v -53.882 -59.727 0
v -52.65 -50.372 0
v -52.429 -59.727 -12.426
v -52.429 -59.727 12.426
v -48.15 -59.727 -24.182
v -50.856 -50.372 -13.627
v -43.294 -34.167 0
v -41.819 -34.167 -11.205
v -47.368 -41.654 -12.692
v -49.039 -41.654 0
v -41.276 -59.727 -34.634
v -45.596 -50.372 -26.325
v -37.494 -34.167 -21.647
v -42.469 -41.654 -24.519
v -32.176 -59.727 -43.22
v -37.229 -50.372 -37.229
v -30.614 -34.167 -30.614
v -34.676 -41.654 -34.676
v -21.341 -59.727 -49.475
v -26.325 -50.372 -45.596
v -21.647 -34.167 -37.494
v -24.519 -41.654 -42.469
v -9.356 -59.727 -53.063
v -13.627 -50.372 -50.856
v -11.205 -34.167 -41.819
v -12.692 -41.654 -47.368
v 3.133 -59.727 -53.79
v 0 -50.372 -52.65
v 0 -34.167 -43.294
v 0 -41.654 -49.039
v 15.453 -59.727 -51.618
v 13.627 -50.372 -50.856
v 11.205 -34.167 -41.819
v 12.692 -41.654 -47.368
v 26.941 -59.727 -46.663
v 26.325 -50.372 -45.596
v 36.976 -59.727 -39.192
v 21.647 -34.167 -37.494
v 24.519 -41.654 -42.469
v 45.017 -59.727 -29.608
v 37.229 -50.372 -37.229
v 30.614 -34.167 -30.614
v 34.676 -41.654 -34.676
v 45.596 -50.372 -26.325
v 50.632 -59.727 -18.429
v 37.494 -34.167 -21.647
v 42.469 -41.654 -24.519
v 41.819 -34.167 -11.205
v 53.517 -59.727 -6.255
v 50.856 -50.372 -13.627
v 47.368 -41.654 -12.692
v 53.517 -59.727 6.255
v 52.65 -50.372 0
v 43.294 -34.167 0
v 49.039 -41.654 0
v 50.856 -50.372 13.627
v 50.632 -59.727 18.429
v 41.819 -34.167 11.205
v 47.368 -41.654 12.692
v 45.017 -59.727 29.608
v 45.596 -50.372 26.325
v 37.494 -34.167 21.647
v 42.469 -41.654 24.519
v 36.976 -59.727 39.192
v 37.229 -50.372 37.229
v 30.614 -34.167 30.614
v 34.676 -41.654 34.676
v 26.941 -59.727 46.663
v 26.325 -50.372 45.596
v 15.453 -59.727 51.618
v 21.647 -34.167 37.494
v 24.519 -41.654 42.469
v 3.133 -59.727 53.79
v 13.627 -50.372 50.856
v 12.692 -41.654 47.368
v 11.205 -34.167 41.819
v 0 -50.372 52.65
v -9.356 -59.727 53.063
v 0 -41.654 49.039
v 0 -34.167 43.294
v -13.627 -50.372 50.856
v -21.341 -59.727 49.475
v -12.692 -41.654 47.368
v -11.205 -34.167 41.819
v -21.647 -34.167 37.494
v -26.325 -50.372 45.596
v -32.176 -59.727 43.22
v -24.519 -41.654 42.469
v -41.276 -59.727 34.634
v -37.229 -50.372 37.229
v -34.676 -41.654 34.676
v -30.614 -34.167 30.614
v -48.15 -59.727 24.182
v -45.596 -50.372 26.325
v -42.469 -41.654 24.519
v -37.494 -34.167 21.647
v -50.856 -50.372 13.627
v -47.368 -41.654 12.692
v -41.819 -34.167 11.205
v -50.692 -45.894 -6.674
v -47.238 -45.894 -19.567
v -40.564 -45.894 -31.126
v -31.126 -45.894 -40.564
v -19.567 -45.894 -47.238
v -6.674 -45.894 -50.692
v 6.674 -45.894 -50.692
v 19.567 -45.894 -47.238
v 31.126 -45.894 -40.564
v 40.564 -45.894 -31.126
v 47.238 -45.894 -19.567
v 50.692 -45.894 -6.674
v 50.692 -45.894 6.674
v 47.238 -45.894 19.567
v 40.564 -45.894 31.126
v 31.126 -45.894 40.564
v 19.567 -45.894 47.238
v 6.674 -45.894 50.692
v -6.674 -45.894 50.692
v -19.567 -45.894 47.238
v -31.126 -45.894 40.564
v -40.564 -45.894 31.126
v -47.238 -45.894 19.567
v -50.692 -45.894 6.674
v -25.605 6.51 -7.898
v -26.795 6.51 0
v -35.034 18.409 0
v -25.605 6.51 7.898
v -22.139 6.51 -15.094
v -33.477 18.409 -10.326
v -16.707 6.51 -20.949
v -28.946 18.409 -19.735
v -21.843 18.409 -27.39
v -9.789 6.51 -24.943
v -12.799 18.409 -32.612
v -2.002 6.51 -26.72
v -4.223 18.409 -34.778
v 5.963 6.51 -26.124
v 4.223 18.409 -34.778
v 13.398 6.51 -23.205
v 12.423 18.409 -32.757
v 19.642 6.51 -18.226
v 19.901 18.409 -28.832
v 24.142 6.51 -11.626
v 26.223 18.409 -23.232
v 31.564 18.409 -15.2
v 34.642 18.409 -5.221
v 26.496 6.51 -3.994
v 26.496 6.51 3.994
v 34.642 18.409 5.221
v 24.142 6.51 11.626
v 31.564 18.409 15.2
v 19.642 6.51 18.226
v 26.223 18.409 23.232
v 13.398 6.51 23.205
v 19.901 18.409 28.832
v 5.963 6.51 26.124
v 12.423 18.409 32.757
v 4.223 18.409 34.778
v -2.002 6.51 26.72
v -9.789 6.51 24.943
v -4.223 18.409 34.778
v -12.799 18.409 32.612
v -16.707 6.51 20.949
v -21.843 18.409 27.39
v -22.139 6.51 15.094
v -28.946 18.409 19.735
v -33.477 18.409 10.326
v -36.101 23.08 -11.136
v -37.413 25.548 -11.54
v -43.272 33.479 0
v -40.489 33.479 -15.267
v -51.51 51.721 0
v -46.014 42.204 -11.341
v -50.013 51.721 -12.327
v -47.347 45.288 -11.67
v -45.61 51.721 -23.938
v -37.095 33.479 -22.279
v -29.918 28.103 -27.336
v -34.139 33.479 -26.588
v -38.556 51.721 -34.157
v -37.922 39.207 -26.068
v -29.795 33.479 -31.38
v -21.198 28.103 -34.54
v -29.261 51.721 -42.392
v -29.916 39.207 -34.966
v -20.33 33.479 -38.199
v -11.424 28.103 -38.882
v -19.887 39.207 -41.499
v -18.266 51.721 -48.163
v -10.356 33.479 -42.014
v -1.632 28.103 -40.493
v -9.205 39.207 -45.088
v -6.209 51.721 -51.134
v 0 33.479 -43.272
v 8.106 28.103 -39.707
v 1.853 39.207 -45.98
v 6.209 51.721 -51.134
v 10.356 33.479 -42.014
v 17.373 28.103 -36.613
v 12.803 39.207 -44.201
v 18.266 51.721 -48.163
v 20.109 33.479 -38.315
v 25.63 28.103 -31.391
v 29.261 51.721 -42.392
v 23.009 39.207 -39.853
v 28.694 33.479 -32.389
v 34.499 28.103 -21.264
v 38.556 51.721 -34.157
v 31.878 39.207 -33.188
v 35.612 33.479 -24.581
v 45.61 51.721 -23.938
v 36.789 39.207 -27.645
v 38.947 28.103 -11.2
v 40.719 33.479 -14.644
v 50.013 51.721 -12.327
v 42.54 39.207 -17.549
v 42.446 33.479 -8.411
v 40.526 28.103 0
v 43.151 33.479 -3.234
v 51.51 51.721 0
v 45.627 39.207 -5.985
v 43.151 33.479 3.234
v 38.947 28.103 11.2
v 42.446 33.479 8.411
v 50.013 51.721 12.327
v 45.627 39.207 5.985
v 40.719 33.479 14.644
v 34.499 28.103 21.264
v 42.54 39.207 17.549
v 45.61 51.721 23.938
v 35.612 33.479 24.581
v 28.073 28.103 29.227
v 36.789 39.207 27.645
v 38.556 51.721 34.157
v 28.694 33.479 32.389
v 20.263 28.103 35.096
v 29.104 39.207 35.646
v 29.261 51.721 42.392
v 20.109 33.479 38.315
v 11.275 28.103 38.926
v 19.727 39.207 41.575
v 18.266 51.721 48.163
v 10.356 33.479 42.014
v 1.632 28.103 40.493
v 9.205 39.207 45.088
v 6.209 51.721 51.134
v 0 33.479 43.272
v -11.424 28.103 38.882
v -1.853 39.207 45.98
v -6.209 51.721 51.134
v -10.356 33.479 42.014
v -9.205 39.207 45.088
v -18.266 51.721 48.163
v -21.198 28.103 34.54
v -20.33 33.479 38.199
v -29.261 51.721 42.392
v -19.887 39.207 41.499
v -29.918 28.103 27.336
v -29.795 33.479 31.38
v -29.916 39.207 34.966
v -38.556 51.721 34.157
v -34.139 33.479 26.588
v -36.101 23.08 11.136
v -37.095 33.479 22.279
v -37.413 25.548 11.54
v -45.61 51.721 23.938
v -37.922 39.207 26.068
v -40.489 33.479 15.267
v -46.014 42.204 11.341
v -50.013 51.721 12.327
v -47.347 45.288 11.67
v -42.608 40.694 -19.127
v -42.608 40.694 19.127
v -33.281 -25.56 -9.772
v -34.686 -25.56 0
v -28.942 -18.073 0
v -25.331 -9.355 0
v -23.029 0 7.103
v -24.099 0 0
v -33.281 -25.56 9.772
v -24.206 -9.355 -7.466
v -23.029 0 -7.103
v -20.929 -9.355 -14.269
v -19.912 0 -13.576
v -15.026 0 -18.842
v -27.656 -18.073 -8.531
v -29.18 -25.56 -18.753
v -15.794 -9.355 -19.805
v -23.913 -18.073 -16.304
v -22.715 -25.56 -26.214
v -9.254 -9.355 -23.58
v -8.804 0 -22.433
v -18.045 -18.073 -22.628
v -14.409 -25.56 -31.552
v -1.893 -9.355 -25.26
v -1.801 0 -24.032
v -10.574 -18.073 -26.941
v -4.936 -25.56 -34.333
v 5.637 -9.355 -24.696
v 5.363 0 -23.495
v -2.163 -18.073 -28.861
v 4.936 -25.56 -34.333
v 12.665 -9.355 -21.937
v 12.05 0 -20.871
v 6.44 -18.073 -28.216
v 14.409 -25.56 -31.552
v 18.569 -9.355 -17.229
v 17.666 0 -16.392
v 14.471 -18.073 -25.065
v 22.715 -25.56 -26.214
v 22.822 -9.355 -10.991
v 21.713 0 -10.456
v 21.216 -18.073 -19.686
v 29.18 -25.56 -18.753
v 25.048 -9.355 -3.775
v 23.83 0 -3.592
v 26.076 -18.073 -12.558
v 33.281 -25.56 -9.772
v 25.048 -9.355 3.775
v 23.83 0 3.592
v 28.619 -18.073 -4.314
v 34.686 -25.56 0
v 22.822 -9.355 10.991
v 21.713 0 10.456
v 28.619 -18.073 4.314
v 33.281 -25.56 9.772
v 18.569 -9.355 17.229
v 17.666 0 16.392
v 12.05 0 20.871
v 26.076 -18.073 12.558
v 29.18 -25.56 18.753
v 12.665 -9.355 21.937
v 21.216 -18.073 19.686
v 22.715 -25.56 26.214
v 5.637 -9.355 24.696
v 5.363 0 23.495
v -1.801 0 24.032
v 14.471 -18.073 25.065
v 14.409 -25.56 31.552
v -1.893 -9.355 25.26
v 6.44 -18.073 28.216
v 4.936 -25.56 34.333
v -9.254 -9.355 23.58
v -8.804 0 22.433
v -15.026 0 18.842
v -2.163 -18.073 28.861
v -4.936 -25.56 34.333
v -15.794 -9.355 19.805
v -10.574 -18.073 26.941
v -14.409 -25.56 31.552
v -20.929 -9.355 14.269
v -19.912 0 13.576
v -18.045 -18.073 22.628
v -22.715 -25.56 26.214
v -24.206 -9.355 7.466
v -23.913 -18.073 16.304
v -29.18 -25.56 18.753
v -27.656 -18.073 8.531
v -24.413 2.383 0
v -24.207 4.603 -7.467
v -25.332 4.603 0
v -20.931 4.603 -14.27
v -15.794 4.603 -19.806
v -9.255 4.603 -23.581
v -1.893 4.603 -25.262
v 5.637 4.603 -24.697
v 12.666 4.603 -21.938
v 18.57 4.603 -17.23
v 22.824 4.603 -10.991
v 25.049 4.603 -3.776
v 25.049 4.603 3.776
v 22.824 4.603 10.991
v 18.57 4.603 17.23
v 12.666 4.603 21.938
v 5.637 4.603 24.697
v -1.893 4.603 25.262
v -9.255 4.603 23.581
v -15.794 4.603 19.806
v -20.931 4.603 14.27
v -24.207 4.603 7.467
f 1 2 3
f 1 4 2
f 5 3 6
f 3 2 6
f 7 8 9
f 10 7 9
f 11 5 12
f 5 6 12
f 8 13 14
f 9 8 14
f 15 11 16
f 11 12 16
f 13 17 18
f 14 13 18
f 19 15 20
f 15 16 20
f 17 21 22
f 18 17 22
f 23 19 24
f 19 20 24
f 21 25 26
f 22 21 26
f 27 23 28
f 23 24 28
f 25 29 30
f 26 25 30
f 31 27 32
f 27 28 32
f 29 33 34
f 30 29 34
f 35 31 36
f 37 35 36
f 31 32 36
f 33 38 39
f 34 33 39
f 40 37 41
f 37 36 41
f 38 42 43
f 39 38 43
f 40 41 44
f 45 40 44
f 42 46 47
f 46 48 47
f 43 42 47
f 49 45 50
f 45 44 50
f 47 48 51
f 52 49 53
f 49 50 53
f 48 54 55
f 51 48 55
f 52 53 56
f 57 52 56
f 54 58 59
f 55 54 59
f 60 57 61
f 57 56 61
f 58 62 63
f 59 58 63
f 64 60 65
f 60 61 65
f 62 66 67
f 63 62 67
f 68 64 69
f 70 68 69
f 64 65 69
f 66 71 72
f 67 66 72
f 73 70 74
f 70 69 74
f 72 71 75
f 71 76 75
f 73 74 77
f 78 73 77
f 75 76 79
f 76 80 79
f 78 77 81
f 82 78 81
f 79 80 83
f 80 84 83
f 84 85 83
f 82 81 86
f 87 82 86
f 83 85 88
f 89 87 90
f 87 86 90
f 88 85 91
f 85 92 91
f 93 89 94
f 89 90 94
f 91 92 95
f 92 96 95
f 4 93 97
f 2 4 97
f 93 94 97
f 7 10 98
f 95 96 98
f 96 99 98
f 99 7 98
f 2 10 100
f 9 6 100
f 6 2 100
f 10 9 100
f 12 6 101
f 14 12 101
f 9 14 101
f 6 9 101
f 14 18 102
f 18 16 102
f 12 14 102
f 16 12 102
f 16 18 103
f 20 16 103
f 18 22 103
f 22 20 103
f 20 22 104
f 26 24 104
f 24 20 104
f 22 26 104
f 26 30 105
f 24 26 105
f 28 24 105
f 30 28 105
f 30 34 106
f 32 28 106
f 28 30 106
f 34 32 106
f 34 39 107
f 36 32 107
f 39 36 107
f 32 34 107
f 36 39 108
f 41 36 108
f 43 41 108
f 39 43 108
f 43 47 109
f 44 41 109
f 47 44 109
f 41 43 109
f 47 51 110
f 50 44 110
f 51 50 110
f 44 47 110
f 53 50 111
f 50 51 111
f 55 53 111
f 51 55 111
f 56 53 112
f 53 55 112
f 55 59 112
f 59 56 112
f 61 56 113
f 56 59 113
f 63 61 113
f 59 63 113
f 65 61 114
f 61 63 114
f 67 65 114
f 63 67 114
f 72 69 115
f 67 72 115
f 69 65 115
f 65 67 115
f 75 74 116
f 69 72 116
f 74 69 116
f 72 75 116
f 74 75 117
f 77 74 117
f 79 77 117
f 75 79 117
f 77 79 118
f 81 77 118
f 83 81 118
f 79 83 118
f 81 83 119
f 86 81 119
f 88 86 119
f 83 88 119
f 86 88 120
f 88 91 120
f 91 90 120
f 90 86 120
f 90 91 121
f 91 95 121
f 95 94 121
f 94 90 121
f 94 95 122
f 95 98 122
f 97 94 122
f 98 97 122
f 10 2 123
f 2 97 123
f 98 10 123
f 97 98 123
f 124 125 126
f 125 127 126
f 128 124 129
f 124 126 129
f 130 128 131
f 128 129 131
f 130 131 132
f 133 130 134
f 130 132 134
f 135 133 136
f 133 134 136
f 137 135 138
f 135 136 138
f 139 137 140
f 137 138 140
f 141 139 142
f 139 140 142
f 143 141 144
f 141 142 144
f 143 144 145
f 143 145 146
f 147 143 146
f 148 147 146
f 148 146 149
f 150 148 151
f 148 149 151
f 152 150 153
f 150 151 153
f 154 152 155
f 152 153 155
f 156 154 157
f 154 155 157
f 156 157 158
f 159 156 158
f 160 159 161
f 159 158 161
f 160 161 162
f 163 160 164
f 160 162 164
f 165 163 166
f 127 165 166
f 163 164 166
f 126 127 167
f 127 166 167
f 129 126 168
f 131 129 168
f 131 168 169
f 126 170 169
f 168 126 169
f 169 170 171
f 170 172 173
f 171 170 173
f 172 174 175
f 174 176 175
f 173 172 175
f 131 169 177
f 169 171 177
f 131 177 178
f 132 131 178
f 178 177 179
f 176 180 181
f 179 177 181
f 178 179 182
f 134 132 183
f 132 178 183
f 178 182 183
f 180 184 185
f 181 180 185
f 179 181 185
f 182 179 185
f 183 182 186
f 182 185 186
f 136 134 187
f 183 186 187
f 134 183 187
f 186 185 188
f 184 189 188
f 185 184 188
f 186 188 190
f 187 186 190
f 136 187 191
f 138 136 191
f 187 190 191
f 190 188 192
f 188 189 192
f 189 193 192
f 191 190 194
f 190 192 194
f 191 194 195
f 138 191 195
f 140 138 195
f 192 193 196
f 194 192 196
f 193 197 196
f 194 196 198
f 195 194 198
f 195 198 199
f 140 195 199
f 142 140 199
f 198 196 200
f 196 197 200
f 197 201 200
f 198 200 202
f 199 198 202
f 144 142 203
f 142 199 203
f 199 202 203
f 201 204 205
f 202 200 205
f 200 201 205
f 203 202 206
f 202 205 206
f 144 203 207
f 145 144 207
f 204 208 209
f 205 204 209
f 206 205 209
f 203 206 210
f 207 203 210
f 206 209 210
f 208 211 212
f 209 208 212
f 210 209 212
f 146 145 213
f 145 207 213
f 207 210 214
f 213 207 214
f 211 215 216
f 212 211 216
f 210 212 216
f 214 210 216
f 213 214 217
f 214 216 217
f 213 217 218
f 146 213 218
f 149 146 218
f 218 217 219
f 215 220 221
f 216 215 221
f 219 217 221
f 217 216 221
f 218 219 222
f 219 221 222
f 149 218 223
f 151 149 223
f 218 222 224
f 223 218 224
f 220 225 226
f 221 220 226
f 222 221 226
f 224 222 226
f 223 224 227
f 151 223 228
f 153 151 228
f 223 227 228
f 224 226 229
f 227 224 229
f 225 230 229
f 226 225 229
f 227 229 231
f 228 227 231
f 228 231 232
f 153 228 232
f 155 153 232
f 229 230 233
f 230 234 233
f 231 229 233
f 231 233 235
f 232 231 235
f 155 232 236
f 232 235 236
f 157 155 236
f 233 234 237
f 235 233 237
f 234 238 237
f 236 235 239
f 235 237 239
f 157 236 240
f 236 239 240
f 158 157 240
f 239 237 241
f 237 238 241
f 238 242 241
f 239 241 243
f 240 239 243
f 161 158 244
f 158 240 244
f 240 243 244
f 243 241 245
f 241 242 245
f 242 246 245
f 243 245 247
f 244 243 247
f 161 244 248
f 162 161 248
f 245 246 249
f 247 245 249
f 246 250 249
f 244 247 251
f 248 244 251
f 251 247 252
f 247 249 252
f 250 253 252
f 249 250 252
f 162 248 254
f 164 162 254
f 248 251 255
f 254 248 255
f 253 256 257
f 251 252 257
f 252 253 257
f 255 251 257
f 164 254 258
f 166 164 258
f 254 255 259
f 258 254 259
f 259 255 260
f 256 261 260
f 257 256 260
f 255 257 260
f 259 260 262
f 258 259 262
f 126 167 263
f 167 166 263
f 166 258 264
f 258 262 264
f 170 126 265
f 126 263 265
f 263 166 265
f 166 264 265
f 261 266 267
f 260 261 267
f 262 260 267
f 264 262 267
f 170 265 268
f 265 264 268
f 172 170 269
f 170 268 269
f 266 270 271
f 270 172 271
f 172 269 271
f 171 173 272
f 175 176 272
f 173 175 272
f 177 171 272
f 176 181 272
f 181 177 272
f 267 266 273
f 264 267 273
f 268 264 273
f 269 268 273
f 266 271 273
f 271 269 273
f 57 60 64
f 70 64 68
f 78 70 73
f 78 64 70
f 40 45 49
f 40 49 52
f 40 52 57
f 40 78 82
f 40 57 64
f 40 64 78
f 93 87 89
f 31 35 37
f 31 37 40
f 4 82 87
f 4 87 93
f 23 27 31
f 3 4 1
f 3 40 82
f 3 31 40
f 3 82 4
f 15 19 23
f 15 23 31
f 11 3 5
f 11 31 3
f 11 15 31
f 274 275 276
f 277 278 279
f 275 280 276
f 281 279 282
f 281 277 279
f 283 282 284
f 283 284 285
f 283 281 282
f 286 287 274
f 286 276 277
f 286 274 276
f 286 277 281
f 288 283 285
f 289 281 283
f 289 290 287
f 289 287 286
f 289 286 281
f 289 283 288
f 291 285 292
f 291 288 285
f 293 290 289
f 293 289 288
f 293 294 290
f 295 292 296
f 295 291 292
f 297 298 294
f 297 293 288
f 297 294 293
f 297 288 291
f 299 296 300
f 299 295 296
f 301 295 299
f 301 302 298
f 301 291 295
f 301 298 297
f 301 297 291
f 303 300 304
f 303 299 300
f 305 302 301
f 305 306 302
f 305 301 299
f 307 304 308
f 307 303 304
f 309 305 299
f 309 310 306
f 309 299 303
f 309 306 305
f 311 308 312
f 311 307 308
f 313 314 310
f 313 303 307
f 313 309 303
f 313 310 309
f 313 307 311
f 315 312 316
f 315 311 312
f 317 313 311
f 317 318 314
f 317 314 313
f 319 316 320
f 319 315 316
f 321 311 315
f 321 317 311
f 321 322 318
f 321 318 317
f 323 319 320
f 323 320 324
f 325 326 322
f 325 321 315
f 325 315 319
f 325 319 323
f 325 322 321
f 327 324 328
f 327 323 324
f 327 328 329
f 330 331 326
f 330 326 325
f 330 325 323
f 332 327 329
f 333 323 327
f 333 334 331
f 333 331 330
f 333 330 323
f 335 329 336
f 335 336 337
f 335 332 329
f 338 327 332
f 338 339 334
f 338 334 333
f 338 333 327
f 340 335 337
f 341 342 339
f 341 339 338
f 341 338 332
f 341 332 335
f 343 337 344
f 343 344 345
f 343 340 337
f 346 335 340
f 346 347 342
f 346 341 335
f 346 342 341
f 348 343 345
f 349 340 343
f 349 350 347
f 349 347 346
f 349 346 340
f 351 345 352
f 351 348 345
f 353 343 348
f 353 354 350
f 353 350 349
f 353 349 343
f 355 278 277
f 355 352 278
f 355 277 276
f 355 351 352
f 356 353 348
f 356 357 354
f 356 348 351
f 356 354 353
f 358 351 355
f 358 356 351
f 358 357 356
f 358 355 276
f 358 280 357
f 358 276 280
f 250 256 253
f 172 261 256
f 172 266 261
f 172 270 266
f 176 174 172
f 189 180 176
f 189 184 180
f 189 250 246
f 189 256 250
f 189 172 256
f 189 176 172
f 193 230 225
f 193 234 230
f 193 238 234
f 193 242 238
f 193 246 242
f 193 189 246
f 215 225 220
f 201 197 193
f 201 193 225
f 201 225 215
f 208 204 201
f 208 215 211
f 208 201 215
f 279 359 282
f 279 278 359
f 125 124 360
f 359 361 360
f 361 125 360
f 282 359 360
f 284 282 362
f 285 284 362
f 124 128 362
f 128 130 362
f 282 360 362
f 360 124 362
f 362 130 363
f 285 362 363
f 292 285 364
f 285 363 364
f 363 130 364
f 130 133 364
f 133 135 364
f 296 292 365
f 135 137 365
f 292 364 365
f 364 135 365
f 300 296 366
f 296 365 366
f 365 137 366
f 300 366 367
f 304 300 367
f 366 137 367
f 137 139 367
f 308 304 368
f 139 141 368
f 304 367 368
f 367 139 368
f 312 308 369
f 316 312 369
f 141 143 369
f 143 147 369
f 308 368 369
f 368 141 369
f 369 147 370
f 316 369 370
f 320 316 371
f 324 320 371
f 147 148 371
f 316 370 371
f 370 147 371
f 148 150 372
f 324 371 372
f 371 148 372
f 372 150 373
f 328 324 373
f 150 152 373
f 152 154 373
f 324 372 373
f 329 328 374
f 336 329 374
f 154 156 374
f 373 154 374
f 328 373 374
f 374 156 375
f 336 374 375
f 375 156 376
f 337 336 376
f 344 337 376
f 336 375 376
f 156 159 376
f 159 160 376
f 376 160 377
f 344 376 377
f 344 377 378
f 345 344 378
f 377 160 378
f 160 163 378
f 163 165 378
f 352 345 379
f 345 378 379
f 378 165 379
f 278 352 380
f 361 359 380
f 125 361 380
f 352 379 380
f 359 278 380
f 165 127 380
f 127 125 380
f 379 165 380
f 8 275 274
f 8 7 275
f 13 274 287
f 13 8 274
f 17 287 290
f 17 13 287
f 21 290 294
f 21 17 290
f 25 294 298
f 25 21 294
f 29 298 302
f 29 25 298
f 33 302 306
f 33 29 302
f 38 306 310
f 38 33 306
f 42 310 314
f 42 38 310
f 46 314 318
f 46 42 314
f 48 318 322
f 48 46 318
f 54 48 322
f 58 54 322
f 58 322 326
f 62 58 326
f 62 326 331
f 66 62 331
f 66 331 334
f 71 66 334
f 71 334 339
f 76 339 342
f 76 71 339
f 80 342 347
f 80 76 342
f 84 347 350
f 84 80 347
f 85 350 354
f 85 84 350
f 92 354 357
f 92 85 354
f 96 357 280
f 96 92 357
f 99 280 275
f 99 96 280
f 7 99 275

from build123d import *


with BuildPart() as part:
    # Sketch1 → Revolve1 (revolve)
    with BuildSketch(Plane.XY, mode=Mode.PRIVATE) as revolve1_sk:
        with BuildLine():
            Line((53.881648239, -59.727398382), (0, -59.727398382))
            Line((0, -59.727398382), (0, 51.720538141))
            Line((0, 51.720538141), (51.50993, 51.720538141))
            add(Edge.make_bspline(
                [(26.7953998, 6.509515166), (39.1526649, 21.980332275), (51.50993, 51.720538141)],
                knots=[0, 0, 0, 1, 1, 1], degree=2))
            add(Edge.make_bspline(
                [(24.099188471, 0.000275515), (24.099189098, 0.036168168), (24.099726929, 0.110389205), (24.10214432, 0.267916585), (24.108582165, 0.427339632), (24.120654196, 0.647039782), (24.141555684, 0.901708843), (24.175305316, 1.202812788), (24.226619903, 1.542326013), (24.290664299, 1.881272292), (24.367262199, 2.216629935), (24.456444169, 2.549514936), (24.55786201, 2.87836816), (24.671739668, 3.203622556), (24.797317368, 3.523902673), (24.935406574, 3.839942248), (25.084190898, 4.1495577), (25.24613282, 4.455058638), (25.416609102, 4.751577091), (25.602635318, 5.045979377), (25.791908867, 5.325794451), (26.004526072, 5.611003058), (26.178996971, 5.833189163), (26.366466353, 6.050227152), (26.504675845, 6.208917162), (26.670562667, 6.382397294), (26.744640858, 6.458754357), (26.7953998, 6.509515166)],
                knots=[0.082568816, 0.082568816, 0.082568816, 0.082568816, 0.082568816, 0.102426634, 0.122284453, 0.142142271, 0.162000089, 0.201715725, 0.241431362, 0.281146998, 0.320862634, 0.360578271, 0.400293907, 0.440009544, 0.47972518, 0.519440816, 0.559156453, 0.598872089, 0.638587725, 0.678303362, 0.718018998, 0.757734635, 0.797450271, 0.837165907, 0.857023726, 0.876881544, 0.91659718, 0.91659718, 0.91659718, 0.91659718, 0.91659718], degree=4))
            add(Edge.make_bspline(
                [(24.099188471, 0.000275515), (24.099189702, -0.070253128), (24.09971885, -0.213308671), (24.102094536, -0.542907397), (24.108418931, -0.823884877), (24.117904054, -1.194546552), (24.130546348, -1.513159539), (24.146346573, -1.861664084), (24.165301833, -2.193431352), (24.192939448, -2.61779388), (24.232407657, -3.121758427), (24.30342032, -3.879703155), (24.423247294, -4.886174868), (24.599606665, -6.05643524), (24.851005859, -7.384890894), (25.151915945, -8.703298994), (25.50189126, -10.009361687), (25.900481625, -11.301544074), (26.347066039, -12.577823812), (26.841123975, -13.83661196), (27.381793779, -15.075921604), (27.968600048, -16.294334268), (28.600260064, -17.489663267), (29.276653067, -18.661012229), (29.995565778, -19.805467867), (30.75814268, -20.923584544), (31.459287877, -21.874136229), (32.08885681, -22.673169948), (32.624249106, -23.320146605), (33.07237646, -23.839729482), (33.50857072, -24.329540711), (33.935946817, -24.788208854), (34.245679337, -25.113592774), (34.536980656, -25.40937351), (34.636533124, -25.509674395), (34.686403502, -25.55954658)],
                knots=[0.082637729, 0.082637729, 0.082637729, 0.082637729, 0.082637729, 0.092574926, 0.102512123, 0.11244932, 0.122386517, 0.132323714, 0.142260911, 0.152198108, 0.162135305, 0.182009699, 0.201884093, 0.24163288, 0.281381668, 0.321130456, 0.360879243, 0.400628031, 0.440376819, 0.480125606, 0.519874394, 0.559623181, 0.599371969, 0.639120757, 0.678869544, 0.718618332, 0.75836712, 0.798115907, 0.817990301, 0.837864695, 0.857739089, 0.877613483, 0.897487877, 0.907425074, 0.91736227, 0.91736227, 0.91736227, 0.91736227, 0.91736227], degree=4))
            Line((34.686403502, -25.55954658), (43.294031702, -34.167174779))
            add(Edge.make_bspline(
                [(53.881648239, -59.727398382), (53.881647008, -59.656868328), (53.881117865, -59.515291274), (53.878742017, -59.181449787), (53.872417419, -58.904680664), (53.862931934, -58.532452659), (53.850289038, -58.212722793), (53.830538212, -57.781479613), (53.800525874, -57.28084507), (53.756313714, -56.687883336), (53.677409048, -55.848365536), (53.577547462, -55.00805103), (53.456796391, -54.172320599), (53.286931432, -53.172310408), (53.092184802, -52.177327988), (52.86649574, -51.188424249), (52.610134849, -50.207374203), (52.32940997, -49.232962903), (52.024469374, -48.265854385), (51.633658471, -47.149020227), (51.139641007, -45.890293563), (50.598854405, -44.650853958), (50.012181586, -43.432586677), (49.380240895, -42.236978387), (48.704245899, -41.066040024), (47.984596196, -39.920857799), (47.22322282, -38.803961377), (46.519989747, -37.851336919), (45.893658628, -37.055557253), (45.352938374, -36.40326641), (44.915247645, -35.894132759), (44.514896888, -35.446877781), (44.181578203, -35.084516308), (43.874045326, -34.760225272), (43.67419311, -34.551434571), (43.444512777, -34.318401406), (43.343903856, -34.217047173), (43.294031702, -34.167174779)],
                knots=[0.082637729, 0.082637729, 0.082637729, 0.082637729, 0.082637729, 0.092574926, 0.102512123, 0.11244932, 0.122386517, 0.132323714, 0.142260911, 0.162135305, 0.182009699, 0.201884093, 0.24163288, 0.261507274, 0.281381668, 0.321130456, 0.360879243, 0.380753637, 0.400628031, 0.440376819, 0.480125606, 0.519874394, 0.559623181, 0.599371969, 0.639120757, 0.678869544, 0.718618332, 0.75836712, 0.798115907, 0.817990301, 0.837864695, 0.857739089, 0.877613483, 0.88755068, 0.897487877, 0.907425074, 0.91736227, 0.91736227, 0.91736227, 0.91736227, 0.91736227], degree=4))
        make_face()
    revolve(revolve1_sk.sketch.rotate(Axis((0, 61.162466261, 0), (0, -1, 0)), 180), axis=Axis((0, 61.162466261, 0), (0, -1, 0)))


solid = part.part
